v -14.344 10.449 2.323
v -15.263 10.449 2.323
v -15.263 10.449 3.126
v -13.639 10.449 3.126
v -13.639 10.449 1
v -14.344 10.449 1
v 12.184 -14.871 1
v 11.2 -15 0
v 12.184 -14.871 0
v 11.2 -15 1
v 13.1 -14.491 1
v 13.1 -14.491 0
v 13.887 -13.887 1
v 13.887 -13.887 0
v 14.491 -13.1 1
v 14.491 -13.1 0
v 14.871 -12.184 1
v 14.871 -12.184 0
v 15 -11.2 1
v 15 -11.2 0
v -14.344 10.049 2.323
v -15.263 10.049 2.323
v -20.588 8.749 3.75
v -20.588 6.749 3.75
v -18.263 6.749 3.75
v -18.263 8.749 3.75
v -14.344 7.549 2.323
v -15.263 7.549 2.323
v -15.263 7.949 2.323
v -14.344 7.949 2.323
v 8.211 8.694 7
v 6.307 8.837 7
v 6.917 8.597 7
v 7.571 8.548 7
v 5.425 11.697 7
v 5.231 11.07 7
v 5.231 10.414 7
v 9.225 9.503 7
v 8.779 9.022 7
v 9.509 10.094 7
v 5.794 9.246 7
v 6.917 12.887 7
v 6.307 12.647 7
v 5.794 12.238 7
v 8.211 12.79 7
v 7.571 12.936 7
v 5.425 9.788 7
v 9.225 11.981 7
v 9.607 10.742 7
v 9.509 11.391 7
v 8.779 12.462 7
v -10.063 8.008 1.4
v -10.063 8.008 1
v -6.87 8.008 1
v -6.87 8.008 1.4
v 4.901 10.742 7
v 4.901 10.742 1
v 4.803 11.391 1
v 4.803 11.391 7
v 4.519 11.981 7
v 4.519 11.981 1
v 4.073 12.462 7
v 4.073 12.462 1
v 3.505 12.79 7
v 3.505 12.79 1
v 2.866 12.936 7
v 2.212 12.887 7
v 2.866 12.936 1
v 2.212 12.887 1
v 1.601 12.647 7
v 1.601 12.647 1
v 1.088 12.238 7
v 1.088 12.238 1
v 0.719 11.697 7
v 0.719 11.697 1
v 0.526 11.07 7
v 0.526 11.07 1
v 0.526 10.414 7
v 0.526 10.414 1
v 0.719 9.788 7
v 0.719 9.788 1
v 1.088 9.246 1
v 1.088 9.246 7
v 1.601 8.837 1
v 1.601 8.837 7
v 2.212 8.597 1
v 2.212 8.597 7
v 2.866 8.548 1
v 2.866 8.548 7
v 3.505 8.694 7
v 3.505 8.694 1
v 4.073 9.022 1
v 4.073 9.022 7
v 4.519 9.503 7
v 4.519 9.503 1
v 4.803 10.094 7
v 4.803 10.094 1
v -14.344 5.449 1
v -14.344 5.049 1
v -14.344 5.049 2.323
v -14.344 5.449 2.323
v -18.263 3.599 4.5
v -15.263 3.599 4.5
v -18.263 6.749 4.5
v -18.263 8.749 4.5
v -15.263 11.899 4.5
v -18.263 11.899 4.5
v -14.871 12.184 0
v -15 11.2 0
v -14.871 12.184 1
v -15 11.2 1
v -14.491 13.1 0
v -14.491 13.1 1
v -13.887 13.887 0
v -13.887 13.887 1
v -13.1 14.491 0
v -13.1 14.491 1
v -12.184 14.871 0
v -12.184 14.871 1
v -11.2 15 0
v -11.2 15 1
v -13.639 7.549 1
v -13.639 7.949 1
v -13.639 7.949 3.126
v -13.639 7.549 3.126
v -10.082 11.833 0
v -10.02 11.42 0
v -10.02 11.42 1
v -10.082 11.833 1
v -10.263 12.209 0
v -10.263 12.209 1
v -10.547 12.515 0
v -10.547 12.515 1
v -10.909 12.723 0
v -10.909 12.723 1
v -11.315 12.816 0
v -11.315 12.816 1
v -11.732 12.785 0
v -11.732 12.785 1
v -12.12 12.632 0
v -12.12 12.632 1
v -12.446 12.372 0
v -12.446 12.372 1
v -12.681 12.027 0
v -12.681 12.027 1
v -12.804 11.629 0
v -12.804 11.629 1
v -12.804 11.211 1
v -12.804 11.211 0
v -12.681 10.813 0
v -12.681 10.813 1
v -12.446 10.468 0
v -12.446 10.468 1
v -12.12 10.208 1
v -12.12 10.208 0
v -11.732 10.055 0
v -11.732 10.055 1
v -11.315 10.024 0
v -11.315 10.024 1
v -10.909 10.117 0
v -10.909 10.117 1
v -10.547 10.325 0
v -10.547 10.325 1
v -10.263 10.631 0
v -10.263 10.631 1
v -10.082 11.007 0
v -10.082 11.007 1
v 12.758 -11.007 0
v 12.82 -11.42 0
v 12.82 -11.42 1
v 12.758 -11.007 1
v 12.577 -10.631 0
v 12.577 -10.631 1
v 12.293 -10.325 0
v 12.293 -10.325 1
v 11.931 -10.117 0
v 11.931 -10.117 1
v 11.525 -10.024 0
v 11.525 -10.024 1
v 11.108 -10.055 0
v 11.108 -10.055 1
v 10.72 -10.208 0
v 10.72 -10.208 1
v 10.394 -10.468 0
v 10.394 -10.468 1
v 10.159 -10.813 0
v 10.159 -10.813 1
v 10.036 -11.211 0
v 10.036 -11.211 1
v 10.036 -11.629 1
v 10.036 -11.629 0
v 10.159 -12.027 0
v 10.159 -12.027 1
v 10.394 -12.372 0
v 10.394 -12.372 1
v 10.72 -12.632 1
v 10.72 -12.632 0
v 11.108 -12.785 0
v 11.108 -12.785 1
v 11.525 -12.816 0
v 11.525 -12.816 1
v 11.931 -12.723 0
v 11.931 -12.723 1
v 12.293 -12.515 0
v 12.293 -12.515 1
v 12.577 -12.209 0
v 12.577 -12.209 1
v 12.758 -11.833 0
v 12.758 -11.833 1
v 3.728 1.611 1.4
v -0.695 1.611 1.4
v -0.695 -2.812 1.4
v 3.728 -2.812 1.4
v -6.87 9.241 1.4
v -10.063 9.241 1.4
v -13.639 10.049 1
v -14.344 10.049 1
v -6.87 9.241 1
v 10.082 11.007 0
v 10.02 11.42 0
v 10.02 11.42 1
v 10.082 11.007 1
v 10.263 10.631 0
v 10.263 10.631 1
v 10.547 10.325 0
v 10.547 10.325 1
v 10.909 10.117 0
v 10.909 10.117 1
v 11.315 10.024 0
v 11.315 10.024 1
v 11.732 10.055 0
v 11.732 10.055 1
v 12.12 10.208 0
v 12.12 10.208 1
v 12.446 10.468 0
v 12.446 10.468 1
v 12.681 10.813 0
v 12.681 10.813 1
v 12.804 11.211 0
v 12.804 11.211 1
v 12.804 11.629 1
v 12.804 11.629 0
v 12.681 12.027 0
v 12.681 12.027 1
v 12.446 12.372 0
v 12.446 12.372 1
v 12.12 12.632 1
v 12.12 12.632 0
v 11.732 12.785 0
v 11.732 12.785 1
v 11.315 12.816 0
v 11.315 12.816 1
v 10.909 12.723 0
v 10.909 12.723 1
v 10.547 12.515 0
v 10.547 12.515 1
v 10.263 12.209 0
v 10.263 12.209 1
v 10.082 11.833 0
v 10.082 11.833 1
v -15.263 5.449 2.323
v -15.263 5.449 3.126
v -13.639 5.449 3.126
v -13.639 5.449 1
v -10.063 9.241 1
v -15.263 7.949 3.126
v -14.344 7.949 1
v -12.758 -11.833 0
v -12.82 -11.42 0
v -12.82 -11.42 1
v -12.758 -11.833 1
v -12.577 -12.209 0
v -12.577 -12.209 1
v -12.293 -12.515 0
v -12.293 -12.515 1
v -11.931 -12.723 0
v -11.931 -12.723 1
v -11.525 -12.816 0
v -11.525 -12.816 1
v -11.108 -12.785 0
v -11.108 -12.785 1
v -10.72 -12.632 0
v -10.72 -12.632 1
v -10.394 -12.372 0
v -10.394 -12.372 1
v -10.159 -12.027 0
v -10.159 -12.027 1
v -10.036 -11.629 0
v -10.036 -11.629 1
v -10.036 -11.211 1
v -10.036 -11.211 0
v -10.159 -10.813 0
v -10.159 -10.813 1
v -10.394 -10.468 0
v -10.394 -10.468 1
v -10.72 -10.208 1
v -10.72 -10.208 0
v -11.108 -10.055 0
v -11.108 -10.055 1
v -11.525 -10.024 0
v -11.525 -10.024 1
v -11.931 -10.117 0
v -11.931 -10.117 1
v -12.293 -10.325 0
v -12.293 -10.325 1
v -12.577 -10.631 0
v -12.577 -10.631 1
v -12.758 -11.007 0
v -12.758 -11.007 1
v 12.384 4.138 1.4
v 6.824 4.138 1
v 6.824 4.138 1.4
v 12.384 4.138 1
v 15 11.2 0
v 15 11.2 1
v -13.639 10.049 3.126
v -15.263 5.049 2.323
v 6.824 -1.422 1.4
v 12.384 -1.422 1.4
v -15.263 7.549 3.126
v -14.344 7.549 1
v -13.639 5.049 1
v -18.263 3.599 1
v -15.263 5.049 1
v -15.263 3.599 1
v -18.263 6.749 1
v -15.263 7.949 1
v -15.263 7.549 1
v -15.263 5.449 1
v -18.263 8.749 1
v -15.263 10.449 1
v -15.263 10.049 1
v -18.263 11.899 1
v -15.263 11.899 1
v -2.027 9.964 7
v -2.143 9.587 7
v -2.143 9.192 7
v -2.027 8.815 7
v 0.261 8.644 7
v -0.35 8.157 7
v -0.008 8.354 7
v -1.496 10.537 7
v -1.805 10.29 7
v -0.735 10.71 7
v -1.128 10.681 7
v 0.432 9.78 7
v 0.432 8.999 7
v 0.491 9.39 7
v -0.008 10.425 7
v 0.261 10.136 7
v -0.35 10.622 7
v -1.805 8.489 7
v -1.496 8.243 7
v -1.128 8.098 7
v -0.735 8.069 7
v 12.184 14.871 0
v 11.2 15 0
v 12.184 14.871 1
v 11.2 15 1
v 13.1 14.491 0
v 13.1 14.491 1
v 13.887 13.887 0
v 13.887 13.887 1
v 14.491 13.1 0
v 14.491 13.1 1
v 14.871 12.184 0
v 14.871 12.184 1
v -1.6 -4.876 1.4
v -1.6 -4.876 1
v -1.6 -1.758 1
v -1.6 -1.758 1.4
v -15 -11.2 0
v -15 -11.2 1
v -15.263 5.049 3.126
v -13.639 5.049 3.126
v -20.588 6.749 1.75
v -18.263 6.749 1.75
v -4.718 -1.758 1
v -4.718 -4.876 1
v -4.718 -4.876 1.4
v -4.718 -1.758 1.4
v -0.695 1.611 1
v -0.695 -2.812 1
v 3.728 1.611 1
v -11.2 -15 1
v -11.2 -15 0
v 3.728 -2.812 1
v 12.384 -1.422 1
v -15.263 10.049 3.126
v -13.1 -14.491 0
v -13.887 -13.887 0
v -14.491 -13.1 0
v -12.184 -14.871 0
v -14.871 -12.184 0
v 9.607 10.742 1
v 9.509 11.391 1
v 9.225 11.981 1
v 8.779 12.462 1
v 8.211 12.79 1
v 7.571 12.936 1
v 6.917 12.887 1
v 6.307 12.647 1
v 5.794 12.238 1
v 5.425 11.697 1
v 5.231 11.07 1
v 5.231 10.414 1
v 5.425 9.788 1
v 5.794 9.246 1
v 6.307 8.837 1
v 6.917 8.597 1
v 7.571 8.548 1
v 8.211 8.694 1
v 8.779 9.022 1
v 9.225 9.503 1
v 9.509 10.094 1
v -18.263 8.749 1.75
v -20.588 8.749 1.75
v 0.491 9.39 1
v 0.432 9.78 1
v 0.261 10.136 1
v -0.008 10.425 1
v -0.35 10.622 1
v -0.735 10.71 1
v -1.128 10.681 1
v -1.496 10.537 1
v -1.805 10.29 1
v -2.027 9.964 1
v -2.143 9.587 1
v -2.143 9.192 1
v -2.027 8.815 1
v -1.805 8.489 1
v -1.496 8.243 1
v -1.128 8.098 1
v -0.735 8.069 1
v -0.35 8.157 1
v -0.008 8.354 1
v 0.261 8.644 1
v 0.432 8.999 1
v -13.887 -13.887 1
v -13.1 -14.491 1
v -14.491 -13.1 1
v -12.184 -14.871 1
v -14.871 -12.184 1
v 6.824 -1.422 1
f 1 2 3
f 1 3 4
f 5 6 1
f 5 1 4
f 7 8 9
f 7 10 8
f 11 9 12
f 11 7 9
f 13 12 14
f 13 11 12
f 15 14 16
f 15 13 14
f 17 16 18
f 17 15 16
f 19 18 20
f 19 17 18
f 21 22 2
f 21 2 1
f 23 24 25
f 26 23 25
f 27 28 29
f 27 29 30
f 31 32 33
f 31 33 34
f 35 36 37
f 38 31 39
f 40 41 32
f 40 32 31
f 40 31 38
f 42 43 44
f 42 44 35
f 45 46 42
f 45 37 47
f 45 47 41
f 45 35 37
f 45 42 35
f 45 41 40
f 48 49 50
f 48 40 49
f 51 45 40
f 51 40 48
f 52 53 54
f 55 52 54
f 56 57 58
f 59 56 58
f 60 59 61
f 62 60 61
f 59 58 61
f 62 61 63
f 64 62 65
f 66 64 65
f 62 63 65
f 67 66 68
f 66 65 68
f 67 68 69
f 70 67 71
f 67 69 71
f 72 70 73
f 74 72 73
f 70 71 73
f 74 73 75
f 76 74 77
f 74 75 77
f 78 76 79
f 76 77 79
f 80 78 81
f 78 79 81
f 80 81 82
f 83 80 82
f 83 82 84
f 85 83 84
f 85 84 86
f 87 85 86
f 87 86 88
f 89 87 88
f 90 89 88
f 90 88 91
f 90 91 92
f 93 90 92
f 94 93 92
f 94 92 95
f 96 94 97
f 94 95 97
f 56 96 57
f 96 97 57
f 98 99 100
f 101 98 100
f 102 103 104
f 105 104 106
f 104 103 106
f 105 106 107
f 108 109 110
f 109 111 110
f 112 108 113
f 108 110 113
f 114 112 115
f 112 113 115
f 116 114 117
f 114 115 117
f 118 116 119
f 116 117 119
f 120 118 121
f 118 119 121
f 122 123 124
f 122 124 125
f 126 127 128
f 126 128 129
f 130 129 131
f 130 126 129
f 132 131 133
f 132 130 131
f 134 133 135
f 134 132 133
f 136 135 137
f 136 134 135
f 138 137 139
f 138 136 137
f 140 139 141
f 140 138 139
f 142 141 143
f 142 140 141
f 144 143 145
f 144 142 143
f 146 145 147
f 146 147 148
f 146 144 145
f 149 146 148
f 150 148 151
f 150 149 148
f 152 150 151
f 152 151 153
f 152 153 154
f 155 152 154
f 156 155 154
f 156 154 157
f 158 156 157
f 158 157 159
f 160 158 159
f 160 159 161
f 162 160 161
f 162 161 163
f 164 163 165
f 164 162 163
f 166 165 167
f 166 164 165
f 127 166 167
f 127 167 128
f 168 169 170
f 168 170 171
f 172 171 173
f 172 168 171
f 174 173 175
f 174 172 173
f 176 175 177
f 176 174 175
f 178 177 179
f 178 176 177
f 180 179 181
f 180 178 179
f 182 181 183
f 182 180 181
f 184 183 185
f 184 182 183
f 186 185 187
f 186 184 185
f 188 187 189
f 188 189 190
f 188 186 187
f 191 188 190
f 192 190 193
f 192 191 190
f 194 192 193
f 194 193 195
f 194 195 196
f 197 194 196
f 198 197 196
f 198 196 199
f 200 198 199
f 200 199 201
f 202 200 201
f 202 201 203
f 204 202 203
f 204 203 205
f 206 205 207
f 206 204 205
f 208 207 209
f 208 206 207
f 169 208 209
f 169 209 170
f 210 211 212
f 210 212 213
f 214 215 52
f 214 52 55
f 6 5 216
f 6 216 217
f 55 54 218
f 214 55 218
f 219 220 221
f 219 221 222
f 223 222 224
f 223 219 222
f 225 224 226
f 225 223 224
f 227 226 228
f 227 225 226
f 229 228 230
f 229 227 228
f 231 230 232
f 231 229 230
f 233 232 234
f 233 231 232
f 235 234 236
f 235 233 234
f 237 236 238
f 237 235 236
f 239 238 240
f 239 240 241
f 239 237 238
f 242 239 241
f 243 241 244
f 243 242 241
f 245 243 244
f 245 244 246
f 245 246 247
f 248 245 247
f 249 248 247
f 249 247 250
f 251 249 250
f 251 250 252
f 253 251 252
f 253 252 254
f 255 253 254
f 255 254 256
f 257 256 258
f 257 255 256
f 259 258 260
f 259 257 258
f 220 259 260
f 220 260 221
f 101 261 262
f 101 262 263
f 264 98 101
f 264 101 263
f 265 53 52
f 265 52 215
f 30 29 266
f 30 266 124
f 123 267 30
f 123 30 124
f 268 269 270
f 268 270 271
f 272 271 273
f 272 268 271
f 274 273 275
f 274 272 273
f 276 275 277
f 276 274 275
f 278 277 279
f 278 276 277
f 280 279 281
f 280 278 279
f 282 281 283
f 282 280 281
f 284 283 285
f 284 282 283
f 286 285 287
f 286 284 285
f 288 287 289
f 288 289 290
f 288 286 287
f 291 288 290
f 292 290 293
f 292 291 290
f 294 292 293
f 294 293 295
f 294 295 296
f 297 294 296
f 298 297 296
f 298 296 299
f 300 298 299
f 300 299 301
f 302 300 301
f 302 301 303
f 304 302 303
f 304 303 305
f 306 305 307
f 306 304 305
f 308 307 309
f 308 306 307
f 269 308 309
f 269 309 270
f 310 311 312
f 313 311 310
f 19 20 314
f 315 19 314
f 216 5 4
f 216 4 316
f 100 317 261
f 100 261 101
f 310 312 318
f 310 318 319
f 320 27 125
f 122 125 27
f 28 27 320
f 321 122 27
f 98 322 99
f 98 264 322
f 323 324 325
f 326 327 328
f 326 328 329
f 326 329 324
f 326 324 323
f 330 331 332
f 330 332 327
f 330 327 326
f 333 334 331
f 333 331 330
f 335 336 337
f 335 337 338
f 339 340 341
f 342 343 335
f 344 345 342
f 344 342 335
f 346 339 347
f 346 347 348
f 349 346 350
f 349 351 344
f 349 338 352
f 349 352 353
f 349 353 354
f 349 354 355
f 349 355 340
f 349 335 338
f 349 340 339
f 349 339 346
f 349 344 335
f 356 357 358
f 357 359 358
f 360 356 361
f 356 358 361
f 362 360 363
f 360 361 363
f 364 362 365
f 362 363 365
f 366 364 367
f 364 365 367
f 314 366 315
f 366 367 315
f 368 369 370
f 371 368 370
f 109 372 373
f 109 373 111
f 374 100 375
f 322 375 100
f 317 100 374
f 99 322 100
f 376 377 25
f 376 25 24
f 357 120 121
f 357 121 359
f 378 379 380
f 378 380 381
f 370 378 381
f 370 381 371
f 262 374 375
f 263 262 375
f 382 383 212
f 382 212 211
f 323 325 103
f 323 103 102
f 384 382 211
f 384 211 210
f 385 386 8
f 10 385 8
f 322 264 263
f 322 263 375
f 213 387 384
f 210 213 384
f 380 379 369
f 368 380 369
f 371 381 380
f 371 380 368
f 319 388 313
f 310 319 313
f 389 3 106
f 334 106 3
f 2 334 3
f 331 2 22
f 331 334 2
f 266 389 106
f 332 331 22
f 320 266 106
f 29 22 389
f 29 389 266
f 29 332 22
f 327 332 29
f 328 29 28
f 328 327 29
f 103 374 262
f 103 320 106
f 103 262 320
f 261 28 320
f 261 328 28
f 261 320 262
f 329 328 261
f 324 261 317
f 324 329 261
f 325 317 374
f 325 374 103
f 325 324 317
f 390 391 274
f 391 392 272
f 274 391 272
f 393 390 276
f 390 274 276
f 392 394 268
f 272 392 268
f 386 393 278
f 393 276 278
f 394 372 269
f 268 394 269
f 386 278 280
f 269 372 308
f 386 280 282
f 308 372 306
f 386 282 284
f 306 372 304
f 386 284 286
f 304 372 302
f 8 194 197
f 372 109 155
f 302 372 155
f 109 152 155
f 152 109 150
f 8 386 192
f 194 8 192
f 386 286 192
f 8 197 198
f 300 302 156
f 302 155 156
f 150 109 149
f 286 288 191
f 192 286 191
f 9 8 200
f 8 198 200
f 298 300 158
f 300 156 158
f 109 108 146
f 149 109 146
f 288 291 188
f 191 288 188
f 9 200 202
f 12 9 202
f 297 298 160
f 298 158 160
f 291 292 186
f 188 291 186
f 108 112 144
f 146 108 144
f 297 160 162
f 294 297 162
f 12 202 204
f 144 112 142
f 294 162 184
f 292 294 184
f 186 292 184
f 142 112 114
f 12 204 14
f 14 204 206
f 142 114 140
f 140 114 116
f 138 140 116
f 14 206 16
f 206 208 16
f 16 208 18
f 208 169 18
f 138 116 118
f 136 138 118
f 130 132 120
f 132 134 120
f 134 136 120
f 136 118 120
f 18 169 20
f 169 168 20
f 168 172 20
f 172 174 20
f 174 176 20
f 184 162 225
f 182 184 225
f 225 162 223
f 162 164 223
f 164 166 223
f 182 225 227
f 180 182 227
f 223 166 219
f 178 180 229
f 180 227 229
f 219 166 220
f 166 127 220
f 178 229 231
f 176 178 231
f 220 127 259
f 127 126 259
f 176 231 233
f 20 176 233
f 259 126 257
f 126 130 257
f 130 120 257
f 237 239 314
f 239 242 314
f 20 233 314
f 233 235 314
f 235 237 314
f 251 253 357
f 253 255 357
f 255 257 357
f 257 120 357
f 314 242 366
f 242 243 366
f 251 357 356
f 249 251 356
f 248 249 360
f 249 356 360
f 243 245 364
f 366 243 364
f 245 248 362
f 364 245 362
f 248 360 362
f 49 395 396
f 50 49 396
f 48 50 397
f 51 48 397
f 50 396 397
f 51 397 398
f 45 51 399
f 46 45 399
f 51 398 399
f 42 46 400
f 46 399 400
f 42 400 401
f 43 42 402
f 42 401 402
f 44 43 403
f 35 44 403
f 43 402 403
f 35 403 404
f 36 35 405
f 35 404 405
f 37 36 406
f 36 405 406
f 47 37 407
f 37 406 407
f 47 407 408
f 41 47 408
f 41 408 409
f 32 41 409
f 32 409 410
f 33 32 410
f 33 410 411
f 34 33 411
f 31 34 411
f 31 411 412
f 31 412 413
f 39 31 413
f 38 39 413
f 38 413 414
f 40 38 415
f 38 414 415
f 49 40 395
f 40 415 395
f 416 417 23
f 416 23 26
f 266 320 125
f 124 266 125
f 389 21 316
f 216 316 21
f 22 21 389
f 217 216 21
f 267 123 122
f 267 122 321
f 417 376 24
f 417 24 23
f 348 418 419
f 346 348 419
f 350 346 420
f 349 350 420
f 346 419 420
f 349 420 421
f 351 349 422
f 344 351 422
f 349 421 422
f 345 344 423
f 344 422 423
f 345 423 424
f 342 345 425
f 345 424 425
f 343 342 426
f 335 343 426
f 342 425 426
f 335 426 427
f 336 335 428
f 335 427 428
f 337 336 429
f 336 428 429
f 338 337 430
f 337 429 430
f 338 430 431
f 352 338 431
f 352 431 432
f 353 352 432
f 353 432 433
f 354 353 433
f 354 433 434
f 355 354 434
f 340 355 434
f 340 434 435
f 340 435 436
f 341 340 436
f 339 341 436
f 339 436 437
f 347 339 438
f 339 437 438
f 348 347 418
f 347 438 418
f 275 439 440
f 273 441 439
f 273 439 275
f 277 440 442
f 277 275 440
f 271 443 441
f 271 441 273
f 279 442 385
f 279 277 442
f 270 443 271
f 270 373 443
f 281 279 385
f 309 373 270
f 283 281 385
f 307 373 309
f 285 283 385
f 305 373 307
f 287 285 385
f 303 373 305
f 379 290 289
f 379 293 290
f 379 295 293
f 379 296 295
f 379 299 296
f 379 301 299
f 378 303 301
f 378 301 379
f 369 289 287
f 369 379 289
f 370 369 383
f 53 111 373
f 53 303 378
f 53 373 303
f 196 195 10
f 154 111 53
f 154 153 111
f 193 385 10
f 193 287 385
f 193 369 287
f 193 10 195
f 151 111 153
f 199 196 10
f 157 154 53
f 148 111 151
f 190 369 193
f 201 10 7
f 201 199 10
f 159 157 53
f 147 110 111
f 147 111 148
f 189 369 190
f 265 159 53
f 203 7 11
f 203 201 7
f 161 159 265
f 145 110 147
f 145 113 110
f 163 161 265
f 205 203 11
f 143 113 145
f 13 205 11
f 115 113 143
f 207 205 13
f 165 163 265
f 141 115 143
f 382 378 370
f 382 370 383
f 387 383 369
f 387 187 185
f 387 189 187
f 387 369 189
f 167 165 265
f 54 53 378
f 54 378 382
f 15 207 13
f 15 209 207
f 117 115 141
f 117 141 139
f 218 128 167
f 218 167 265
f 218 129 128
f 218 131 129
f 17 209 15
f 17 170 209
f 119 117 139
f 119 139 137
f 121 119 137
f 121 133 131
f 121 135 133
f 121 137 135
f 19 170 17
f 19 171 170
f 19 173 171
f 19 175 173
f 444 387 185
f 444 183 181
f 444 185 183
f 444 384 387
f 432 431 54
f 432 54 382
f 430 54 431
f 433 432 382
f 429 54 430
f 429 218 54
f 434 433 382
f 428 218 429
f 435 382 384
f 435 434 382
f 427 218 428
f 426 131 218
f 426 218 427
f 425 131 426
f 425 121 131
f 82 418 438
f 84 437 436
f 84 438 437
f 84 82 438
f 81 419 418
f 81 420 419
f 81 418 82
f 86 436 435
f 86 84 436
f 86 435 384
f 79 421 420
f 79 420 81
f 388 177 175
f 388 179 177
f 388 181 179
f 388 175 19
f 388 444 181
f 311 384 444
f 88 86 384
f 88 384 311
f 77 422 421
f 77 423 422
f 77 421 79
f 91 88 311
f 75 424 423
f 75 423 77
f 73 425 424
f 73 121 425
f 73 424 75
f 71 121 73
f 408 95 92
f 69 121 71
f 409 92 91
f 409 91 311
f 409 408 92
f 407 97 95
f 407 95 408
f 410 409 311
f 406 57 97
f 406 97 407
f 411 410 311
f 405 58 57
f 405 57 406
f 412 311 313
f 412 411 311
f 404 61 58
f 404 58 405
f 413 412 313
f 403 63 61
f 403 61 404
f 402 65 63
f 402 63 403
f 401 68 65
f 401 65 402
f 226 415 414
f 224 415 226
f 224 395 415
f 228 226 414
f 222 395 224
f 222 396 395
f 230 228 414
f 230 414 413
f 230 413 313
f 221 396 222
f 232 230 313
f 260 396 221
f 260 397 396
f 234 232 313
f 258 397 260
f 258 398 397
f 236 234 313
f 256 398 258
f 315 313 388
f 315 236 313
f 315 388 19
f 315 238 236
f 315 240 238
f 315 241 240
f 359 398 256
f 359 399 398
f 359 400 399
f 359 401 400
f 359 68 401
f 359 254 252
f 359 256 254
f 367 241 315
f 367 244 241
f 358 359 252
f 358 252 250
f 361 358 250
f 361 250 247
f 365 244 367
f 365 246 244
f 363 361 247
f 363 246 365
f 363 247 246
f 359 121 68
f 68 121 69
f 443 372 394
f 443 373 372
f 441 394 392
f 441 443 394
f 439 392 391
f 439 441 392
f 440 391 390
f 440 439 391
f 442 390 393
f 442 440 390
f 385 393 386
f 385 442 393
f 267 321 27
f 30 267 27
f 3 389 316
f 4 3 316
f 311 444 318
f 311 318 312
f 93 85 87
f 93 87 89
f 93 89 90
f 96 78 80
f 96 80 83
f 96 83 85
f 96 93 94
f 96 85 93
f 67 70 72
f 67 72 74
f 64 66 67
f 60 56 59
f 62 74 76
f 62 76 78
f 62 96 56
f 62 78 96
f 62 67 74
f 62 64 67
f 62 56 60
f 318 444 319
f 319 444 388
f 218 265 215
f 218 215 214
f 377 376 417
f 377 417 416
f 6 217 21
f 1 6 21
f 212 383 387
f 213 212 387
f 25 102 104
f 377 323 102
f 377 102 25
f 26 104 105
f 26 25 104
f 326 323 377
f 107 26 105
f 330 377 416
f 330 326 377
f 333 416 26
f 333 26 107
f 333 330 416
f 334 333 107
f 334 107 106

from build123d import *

# Parameters (mm, degrees)
ESBO_O1_W                = 30
ESBO_O1_H                = 30
ESBO_O1_R                = 1.4
RESSALTO_EXTRUS_O1_DEPTH = 1
FILETE1_R                = 3.8
ESBO_O2_W                = 4.42271784
ESBO_O2_H                = 4.422717839
ESBO_O2_W_2              = 3.118013776
ESBO_O2_H_2              = 3.118013775
ESBO_O2_W_3              = 5.559988141
ESBO_O2_H_3              = 5.559988141
ESBO_O2_W_4              = 3.193182952
ESBO_O2_H_4              = 1.233032197
RESSALTO_EXTRUS_O2_DEPTH = 0.4
RESSALTO_EXTRUS_O3_DEPTH = 3.5
ESBO_O4_R                = 2.2
ESBO_O4_R_2              = 1.324395516
RESSALTO_EXTRUS_O4_DEPTH = 6
ESBO_O6_W                = 1.838073738
ESBO_O6_H                = 1.373869438
ESBO_O6_W_2              = 0.919036869
ESBO_O6_H_2              = 1.323006201
ESBO_O6_W_3              = 2.325217377
ESBO_O6_H_3              = 0.75
CORTE_EXTRUS_O1_DEPTH    = 10


with BuildPart() as part:
    # Esboço1 → Ressalto-extrusão1 (new body)
    with BuildSketch(Plane.XY):
        Rectangle(ESBO_O1_W, ESBO_O1_H)
        with Locations((-11.42, 11.42)):
            Circle(ESBO_O1_R, mode=Mode.SUBTRACT)
        with Locations(Location((11.42, 11.42, 0), (0, 0, 180))):
            Circle(ESBO_O1_R, mode=Mode.SUBTRACT)
        with Locations((11.42, -11.42)):
            Circle(ESBO_O1_R, mode=Mode.SUBTRACT)
        with Locations(Location((-11.42, -11.42, 0), (0, 0, 180))):
            Circle(ESBO_O1_R, mode=Mode.SUBTRACT)
    extrude(amount=RESSALTO_EXTRUS_O1_DEPTH)

    # Filete1
    filete1_edges = [part.edges().sort_by_distance(p)[0] for p in [
        (15, -15, 0.5),
        (-15, -15, 0.5),
        (-15, 15, 0.5),
        (15, 15, 0.5),
    ]]
    fillet(filete1_edges, radius=FILETE1_R)

    # Esboço2 → Ressalto-extrusão2 (add)
    with BuildSketch(Plane.XY.offset(1)):
        with Locations((1.516360402, -0.600225993)):
            Rectangle(ESBO_O2_W, ESBO_O2_H)
        with Locations((-3.159084171, -3.31703838)):
            Rectangle(ESBO_O2_W_2, ESBO_O2_H_2)
        with Locations((9.60361588, 1.358406194)):
            Rectangle(ESBO_O2_W_3, ESBO_O2_H_3)
        with Locations((-8.466345578, 8.624299786)):
            Rectangle(ESBO_O2_W_4, ESBO_O2_H_4)
    extrude(amount=RESSALTO_EXTRUS_O2_DEPTH)

    # Esboço4 → Ressalto-extrusão4 (add)
    with BuildSketch(Plane.XY.offset(1)):
        with Locations((7.40686854, 10.742100478)):
            Circle(ESBO_O4_R)
        with Locations((2.70119832, 10.742100478)):
            Circle(ESBO_O4_R)
        with Locations((-0.833755816, 9.389590058)):
            Circle(ESBO_O4_R_2)
    extrude(amount=RESSALTO_EXTRUS_O4_DEPTH)


with BuildPart() as body_2:
    # Esboço3 → Ressalto-extrusão3 (new body)
    with BuildSketch(Plane.XY.offset(1)):
        Polygon((-18.262555034, 11.898651044), (-15.262555034, 11.898651044), (-15.262555034, 10.448651044), (-13.638595921, 10.448651044), (-13.638595921, 10.048651044), (-15.262555034, 10.048651044), (-15.262555034, 7.948651044), (-13.638595921, 7.948651044), (-13.638595921, 7.548651044), (-15.262555034, 7.548651044), (-15.262555034, 5.448651044), (-13.638595921, 5.448651044), (-13.638595921, 5.048651044), (-15.262555034, 5.048651044), (-15.262555034, 3.598651044), (-18.262555034, 3.598651044), (-18.262555034, 6.748651044), (-20.587772411, 6.748651044), (-20.587772411, 8.748651044), (-18.262555034, 8.748651044), align=None)
    extrude(amount=RESSALTO_EXTRUS_O3_DEPTH)

    # Esboço6 → Corte-extrusão1 (cut)
    with BuildSketch(Plane.XZ.offset(-3.598651044)):
        with Locations((-14.343518165, 3.813065281)):
            Rectangle(ESBO_O6_W, ESBO_O6_H)
        with Locations((-14.8030366, 1.661503101)):
            Rectangle(ESBO_O6_W_2, ESBO_O6_H_2)
        with Locations((-19.425163723, 4.125)):
            Rectangle(ESBO_O6_W_3, ESBO_O6_H_3)
        with Locations((-19.425163723, 1.375)):
            Rectangle(ESBO_O6_W_3, ESBO_O6_H_3)
    extrude(amount=-CORTE_EXTRUS_O1_DEPTH, mode=Mode.SUBTRACT)


solid = Compound([part.part, body_2.part])
